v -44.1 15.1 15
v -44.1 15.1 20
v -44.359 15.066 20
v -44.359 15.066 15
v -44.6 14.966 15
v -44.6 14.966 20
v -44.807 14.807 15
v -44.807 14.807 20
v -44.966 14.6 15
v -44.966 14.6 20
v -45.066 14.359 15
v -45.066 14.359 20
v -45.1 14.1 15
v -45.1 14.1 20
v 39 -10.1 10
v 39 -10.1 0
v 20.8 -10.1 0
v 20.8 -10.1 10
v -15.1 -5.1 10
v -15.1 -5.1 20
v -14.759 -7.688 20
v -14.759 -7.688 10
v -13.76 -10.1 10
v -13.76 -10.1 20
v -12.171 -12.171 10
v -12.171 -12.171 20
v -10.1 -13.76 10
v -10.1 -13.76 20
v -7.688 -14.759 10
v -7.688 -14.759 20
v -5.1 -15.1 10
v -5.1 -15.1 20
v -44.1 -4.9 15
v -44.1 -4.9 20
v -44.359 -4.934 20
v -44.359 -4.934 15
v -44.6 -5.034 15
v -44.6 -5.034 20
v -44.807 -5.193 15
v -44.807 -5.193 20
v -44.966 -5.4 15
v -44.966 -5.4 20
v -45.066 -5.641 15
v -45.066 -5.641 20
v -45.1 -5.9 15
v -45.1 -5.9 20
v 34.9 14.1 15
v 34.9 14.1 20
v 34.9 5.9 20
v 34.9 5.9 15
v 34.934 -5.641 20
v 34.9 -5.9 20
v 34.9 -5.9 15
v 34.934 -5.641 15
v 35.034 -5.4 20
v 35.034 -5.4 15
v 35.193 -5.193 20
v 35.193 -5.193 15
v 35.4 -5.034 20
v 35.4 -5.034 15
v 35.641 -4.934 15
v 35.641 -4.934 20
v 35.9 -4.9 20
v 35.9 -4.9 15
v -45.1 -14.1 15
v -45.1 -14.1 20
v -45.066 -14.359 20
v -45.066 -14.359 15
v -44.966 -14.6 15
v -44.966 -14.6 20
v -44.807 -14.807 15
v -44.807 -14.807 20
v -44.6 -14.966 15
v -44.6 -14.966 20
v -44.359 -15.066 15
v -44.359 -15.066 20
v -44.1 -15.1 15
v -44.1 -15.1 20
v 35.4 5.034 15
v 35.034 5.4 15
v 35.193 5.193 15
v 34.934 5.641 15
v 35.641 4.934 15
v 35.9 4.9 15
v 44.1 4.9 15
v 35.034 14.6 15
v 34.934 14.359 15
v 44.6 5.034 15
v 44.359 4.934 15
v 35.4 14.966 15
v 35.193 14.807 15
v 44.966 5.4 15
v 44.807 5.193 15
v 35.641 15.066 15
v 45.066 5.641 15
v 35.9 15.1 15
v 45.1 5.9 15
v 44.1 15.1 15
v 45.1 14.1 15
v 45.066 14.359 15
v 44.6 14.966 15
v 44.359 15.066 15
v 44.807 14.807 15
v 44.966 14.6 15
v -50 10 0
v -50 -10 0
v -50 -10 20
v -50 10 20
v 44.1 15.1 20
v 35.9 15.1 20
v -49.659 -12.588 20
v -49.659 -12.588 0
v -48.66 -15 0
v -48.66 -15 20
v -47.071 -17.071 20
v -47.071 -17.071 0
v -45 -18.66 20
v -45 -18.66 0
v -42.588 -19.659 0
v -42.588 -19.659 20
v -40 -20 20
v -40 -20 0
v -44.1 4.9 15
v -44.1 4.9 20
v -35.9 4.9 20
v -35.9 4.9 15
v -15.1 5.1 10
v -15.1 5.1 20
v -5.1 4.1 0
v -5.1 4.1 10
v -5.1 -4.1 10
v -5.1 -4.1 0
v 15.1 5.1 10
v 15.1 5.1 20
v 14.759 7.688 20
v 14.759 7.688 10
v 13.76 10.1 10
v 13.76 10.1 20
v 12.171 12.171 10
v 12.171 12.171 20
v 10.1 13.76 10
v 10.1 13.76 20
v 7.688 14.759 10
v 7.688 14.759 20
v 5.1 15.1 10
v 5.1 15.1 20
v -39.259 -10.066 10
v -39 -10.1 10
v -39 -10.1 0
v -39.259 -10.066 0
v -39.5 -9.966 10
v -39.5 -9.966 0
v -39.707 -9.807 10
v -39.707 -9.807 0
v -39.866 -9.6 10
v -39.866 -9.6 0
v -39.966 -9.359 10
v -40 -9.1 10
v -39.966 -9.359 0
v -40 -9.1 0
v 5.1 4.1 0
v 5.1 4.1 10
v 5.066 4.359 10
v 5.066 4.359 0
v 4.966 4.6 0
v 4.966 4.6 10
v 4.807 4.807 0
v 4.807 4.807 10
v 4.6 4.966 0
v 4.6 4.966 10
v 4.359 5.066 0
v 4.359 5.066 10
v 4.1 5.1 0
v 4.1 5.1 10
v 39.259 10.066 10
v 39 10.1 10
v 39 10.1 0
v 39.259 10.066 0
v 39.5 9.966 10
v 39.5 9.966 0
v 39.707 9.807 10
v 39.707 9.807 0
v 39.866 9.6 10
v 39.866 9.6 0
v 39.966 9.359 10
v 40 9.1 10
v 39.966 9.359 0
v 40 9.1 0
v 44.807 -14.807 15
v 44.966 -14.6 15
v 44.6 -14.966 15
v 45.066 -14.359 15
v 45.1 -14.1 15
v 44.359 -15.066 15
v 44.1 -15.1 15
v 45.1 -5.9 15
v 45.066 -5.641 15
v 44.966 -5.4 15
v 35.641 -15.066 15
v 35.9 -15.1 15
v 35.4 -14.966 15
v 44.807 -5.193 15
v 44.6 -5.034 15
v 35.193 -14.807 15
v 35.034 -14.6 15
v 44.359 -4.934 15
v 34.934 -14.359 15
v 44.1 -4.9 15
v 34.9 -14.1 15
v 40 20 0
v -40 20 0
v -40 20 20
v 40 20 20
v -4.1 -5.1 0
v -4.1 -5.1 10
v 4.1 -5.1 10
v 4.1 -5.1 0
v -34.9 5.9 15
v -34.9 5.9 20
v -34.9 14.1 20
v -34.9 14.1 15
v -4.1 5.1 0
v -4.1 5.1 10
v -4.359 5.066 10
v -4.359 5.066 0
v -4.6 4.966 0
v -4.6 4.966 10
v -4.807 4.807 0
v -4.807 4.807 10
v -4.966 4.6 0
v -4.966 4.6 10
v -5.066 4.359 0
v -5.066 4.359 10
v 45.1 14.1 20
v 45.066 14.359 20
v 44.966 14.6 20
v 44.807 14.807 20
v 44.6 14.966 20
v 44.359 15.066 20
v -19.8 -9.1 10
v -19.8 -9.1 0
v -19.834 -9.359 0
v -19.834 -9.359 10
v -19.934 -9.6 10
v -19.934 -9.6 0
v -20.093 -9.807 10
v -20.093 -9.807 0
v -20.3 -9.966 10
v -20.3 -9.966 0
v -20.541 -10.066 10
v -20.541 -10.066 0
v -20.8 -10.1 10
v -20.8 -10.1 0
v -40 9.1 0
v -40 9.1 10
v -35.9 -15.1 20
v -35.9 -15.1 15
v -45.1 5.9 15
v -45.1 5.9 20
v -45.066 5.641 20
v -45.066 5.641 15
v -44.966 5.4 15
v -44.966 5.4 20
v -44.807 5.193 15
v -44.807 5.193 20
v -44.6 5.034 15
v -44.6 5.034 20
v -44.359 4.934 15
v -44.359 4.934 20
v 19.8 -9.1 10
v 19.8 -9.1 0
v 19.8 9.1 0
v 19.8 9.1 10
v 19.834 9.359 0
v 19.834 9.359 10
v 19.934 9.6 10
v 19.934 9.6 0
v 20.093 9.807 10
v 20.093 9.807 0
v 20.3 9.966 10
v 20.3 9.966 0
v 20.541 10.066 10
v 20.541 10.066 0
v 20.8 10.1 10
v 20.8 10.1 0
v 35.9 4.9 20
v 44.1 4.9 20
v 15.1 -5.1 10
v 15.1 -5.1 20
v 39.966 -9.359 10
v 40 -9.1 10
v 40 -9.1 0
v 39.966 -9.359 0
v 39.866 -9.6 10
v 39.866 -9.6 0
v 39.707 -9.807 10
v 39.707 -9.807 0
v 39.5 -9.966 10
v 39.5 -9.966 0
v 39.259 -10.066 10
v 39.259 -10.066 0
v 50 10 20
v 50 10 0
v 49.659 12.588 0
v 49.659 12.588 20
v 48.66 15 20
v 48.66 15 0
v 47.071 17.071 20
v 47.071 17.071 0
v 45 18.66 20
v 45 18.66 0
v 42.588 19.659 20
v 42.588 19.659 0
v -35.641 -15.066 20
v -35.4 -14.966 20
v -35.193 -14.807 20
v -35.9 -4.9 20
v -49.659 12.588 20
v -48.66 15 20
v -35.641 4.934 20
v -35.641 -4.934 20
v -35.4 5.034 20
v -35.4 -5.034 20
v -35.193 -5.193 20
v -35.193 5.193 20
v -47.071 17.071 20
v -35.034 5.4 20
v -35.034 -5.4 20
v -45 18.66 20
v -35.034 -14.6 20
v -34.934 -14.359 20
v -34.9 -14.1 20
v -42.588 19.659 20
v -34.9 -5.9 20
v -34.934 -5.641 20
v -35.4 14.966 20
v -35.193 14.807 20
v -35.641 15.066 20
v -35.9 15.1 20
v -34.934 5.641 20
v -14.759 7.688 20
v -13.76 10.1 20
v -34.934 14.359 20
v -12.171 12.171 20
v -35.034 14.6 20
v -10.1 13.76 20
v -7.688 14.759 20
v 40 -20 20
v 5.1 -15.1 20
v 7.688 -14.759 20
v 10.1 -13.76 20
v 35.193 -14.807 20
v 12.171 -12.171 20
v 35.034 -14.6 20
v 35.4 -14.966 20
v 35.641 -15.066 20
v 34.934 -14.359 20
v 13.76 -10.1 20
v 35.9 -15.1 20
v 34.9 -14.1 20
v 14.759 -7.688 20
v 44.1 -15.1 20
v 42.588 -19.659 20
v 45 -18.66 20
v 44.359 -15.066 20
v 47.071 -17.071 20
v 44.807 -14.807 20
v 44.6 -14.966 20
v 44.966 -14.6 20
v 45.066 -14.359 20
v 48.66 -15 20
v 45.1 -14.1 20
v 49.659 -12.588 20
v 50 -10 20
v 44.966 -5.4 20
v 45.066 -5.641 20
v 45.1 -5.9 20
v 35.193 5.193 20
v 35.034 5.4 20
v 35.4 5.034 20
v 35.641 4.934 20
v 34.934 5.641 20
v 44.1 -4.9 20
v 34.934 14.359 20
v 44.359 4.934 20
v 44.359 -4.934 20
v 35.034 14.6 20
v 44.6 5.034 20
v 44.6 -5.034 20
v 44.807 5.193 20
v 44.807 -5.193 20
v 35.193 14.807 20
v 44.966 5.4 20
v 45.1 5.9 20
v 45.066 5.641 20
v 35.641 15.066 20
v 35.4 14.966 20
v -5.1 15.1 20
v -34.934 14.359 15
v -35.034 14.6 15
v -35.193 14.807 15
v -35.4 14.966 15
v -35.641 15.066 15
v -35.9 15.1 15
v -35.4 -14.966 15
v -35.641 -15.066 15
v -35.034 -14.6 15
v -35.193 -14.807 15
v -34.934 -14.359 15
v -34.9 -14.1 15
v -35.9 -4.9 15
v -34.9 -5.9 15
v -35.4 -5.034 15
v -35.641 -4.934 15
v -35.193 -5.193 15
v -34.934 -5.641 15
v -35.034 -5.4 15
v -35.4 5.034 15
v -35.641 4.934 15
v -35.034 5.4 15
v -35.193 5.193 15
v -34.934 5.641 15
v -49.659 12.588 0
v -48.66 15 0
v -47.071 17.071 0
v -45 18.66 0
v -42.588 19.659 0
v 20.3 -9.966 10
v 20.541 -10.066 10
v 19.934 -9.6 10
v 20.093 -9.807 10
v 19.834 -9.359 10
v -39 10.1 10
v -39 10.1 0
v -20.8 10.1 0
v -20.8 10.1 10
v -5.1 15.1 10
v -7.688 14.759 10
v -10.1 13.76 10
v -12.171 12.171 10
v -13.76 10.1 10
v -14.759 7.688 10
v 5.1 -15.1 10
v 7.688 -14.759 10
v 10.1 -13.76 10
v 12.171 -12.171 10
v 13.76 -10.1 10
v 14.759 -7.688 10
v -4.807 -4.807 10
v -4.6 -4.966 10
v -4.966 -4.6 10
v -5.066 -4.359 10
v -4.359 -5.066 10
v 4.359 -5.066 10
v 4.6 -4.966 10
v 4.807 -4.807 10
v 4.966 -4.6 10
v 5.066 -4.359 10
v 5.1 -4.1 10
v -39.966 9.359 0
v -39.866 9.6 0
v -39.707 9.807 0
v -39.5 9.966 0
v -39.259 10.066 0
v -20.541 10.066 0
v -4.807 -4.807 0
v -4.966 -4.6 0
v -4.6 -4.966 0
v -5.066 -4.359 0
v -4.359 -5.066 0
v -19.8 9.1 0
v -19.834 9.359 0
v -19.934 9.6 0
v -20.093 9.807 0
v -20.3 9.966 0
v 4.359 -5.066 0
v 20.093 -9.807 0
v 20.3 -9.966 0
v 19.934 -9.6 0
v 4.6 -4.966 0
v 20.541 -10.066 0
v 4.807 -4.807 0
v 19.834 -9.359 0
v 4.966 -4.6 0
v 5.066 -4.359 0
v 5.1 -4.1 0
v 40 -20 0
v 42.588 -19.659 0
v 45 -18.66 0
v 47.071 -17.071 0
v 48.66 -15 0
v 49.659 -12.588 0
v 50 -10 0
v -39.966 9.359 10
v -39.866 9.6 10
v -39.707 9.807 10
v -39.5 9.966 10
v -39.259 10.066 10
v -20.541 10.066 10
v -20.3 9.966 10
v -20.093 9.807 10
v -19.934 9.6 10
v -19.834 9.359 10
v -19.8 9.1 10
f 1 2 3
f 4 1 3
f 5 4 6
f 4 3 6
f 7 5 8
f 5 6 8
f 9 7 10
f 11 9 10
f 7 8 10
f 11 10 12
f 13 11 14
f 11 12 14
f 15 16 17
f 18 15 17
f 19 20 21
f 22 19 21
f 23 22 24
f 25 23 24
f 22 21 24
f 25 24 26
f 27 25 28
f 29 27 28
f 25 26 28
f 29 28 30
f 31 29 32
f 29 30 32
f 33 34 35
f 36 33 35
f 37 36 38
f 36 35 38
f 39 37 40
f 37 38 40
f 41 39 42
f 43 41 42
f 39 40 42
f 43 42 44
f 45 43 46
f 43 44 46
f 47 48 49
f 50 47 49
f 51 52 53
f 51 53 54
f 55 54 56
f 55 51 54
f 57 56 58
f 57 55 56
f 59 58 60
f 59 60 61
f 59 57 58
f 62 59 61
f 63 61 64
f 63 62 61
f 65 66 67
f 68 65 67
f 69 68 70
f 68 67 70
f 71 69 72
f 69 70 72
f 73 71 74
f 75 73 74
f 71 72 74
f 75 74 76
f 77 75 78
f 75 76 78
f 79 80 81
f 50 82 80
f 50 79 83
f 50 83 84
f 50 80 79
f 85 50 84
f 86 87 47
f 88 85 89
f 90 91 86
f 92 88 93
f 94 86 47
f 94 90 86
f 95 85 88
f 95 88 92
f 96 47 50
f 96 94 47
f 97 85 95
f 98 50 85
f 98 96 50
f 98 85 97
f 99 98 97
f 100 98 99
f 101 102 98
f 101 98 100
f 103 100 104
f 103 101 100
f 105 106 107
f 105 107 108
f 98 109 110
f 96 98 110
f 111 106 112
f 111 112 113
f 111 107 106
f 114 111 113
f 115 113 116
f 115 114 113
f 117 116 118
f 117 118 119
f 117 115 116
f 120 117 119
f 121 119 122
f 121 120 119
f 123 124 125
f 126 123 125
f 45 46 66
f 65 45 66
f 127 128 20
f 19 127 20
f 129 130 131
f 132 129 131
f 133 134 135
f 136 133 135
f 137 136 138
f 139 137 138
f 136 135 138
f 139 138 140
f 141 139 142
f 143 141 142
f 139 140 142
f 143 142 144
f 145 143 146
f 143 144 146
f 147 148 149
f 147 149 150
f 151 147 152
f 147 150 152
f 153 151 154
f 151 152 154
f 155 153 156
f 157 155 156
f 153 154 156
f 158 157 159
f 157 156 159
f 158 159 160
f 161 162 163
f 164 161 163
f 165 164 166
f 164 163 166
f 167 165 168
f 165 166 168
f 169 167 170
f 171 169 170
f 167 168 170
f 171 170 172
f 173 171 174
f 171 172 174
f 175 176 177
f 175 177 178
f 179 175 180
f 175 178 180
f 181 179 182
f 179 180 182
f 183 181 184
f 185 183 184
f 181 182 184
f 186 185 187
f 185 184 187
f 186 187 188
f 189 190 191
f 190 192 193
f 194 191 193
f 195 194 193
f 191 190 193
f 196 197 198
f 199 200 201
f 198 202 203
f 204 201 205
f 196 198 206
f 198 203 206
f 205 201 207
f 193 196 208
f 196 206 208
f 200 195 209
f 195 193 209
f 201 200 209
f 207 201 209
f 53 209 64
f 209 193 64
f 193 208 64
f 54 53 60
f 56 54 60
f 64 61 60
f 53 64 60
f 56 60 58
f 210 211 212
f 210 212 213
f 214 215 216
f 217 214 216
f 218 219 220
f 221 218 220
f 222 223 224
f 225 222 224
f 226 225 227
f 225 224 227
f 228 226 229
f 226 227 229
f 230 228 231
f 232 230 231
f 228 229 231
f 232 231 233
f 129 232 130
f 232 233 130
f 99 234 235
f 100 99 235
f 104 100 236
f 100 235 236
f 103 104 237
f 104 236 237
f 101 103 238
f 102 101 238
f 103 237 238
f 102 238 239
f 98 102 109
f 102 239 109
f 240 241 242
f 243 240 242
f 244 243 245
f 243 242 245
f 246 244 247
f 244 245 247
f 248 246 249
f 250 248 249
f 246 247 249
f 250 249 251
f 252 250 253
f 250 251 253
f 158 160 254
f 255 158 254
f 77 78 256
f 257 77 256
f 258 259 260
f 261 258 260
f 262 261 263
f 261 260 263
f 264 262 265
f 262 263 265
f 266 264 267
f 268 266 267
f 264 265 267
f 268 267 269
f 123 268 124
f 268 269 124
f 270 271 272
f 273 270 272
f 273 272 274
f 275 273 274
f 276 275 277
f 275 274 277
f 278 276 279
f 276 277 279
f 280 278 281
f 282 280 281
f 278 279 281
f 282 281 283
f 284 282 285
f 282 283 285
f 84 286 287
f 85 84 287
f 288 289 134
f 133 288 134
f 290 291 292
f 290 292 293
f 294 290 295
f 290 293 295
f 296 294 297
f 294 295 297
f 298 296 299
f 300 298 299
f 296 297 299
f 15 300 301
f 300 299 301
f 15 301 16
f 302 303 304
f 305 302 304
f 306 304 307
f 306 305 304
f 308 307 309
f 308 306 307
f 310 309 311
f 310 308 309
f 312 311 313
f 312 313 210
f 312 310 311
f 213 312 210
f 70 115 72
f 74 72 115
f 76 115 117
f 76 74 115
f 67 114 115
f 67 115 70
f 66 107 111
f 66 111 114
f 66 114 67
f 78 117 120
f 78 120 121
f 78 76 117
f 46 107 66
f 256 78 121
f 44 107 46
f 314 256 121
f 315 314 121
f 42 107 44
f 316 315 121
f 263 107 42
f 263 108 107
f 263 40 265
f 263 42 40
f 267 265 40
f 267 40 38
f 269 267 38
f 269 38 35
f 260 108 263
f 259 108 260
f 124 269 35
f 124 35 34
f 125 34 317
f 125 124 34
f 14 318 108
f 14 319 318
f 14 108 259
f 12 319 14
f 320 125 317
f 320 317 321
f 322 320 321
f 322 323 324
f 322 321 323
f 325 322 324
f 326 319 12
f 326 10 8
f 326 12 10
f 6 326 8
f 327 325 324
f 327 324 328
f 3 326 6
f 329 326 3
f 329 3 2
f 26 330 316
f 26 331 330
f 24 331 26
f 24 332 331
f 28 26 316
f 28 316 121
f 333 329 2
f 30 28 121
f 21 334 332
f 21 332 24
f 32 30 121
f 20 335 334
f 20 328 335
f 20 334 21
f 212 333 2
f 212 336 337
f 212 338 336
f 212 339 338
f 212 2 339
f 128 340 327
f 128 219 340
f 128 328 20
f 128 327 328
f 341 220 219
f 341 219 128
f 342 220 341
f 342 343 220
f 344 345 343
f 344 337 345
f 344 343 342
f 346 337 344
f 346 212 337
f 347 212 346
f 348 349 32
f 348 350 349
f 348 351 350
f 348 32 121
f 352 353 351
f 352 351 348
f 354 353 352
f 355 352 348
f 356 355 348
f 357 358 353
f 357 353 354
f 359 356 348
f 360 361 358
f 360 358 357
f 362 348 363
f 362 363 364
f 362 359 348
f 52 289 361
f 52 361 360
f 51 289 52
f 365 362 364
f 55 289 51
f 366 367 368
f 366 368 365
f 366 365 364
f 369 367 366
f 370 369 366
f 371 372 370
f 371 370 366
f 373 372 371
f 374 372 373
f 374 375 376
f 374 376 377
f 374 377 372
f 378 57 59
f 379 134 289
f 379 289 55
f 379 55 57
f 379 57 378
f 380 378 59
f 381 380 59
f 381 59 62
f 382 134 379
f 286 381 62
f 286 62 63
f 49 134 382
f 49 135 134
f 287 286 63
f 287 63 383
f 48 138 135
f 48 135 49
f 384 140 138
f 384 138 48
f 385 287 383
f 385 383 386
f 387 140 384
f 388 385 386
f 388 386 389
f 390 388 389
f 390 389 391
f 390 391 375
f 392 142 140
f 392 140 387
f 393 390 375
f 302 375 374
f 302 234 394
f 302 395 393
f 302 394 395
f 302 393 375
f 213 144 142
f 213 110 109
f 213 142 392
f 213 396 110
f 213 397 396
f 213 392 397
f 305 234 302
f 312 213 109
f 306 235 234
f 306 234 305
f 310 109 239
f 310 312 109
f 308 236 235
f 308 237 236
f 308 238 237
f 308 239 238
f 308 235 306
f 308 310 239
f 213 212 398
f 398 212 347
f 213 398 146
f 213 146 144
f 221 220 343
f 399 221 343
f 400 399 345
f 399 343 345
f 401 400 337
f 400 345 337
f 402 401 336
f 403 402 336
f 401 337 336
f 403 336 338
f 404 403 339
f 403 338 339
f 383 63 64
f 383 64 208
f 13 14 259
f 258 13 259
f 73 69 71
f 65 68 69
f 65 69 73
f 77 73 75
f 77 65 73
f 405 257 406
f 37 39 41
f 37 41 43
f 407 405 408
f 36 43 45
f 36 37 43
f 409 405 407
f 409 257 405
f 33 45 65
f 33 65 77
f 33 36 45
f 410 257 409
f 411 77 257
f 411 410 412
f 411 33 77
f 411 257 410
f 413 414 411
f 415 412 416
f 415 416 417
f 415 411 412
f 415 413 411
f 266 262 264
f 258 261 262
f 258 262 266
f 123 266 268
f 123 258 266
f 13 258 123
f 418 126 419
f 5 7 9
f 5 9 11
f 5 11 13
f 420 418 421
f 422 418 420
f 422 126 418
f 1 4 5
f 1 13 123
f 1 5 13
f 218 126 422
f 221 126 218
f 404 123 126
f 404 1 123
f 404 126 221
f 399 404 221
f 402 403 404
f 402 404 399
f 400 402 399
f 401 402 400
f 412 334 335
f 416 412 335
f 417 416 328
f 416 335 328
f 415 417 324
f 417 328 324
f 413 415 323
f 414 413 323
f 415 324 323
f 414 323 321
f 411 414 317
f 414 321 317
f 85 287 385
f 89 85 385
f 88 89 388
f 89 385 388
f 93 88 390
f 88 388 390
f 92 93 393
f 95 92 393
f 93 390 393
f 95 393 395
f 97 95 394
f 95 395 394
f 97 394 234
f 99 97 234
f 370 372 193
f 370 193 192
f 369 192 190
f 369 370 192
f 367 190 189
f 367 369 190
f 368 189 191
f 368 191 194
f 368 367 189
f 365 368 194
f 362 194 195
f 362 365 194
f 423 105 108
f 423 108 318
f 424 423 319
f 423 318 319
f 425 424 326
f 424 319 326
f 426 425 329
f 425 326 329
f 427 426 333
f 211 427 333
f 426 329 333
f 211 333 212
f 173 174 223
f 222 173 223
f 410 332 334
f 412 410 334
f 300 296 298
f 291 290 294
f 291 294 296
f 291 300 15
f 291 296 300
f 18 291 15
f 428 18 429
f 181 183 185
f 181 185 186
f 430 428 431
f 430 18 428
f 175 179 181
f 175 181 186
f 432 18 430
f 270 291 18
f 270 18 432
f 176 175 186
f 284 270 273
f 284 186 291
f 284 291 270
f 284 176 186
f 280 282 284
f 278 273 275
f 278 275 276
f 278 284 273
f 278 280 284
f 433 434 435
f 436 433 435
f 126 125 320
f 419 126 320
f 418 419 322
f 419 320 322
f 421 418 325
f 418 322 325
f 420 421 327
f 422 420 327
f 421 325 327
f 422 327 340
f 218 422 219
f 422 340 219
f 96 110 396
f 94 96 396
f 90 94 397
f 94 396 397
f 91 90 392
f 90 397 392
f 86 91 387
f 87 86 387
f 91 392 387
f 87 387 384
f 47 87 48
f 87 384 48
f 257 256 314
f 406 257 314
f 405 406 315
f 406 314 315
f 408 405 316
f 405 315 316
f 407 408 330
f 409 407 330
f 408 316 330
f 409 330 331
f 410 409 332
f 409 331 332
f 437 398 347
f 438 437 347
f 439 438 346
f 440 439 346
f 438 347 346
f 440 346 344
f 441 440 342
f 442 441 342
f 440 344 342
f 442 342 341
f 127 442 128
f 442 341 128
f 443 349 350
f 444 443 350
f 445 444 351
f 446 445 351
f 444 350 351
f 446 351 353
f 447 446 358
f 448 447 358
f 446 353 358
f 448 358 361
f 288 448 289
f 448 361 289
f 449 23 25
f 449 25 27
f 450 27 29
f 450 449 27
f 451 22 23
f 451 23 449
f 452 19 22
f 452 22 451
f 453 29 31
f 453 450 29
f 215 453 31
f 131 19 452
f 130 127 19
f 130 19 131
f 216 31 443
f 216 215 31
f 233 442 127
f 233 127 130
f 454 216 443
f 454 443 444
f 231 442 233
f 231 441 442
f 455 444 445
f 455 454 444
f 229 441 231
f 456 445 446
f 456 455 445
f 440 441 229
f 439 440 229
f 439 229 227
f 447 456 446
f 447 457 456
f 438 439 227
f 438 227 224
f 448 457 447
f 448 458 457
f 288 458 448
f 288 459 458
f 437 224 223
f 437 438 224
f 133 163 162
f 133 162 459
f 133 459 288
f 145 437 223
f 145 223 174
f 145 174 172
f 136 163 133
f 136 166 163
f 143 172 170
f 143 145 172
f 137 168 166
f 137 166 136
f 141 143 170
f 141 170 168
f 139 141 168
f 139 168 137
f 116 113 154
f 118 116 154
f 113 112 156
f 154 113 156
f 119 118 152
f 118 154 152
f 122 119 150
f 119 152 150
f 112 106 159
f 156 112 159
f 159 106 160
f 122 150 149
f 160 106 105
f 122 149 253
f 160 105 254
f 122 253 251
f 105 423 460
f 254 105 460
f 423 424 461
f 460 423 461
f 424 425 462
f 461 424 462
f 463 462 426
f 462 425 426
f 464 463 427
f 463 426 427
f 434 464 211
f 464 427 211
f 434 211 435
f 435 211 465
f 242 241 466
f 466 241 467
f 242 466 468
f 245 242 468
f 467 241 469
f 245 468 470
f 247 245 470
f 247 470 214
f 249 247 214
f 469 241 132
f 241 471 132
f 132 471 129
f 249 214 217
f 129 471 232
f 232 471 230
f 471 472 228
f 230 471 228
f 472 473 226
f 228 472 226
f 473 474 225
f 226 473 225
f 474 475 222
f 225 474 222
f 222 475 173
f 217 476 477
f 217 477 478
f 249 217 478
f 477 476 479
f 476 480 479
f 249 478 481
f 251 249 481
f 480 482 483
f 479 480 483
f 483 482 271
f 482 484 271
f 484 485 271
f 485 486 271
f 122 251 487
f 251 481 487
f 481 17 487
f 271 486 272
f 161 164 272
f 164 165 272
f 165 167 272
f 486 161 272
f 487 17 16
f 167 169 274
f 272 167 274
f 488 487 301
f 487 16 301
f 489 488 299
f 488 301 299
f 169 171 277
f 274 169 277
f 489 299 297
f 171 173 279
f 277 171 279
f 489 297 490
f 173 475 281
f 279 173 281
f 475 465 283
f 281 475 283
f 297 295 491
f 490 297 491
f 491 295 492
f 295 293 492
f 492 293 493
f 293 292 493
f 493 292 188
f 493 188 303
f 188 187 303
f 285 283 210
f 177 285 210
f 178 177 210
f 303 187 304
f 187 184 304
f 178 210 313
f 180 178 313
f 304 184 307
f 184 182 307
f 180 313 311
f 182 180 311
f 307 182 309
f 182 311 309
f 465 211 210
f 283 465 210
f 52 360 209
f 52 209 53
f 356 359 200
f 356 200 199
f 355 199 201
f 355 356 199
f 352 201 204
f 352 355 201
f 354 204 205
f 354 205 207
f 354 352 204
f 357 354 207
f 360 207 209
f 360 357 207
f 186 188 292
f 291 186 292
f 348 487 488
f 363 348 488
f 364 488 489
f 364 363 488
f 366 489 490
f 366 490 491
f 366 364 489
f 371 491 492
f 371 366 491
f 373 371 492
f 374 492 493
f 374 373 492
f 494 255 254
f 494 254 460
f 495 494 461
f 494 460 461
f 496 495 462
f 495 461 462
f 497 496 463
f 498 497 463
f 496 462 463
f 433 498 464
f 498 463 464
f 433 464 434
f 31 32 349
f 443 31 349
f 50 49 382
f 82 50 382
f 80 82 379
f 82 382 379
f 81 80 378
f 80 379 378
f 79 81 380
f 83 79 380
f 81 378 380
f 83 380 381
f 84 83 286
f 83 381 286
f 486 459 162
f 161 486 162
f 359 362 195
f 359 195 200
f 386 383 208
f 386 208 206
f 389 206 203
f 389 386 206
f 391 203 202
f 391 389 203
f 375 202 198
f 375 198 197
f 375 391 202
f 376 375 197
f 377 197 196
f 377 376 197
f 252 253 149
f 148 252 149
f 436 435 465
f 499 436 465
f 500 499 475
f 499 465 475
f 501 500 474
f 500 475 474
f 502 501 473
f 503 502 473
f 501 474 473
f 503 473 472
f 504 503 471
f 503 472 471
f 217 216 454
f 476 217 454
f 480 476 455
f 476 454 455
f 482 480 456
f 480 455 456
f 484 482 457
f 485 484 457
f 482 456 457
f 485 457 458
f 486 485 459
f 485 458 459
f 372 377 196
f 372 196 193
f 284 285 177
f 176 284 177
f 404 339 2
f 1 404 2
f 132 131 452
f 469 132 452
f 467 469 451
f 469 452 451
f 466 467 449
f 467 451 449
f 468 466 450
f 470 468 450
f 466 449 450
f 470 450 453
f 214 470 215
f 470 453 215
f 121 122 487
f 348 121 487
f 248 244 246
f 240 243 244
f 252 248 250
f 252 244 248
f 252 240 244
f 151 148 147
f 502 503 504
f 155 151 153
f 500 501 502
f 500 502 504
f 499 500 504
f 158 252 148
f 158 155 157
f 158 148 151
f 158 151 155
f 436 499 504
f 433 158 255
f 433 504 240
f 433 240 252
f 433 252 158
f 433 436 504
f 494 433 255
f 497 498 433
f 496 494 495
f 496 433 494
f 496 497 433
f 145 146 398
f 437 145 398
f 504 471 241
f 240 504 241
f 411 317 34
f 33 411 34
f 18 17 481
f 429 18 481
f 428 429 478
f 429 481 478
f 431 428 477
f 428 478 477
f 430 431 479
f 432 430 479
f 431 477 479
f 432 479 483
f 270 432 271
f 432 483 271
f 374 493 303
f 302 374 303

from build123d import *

# Parameters (mm, degrees)
SKETCH_1_W          = 100
SKETCH_1_H          = 40
EXTRUDE_1_DEPTH     = 20
FILLET_2_R          = 10
CUT_EXTRUDE_1_DEPTH = 10
CUT_EXTRUDE_2_DEPTH = 55.772255751
CUT_EXTRUDE_3_DEPTH = 5
CUT_EXTRUDE_4_DEPTH = 10


with BuildPart() as part:
    # ｽｹｯﾁ1 → ﾎﾞｽ - 押し出し1 (new body)
    with BuildSketch(Plane.XY):
        Rectangle(SKETCH_1_W, SKETCH_1_H)
    extrude(amount=EXTRUDE_1_DEPTH)

    # ﾌｨﾚｯﾄ2
    fillet_2_edges = [part.edges().sort_by_distance(p)[0] for p in [
        (50, -20, 10),
        (-50, -20, 10),
        (-50, 20, 10),
        (50, 20, 10),
    ]]
    fillet(fillet_2_edges, radius=FILLET_2_R)

    # ｽｹｯﾁ2 → ｶｯﾄ - 押し出し1 (cut)
    with BuildSketch(Plane.XY.offset(20)):
        with BuildLine():
            Line((-5.1, -15.1), (5.1, -15.1))
            ThreePointArc((5.1, -15.1), (12.171067812, -12.171067812), (15.1, -5.1))
            Line((15.1, -5.1), (15.1, 5.1))
            ThreePointArc((15.1, 5.1), (12.171067812, 12.171067812), (5.1, 15.1))
            Line((5.1, 15.1), (-5.1, 15.1))
            ThreePointArc((-5.1, 15.1), (-12.171067812, 12.171067812), (-15.1, 5.1))
            Line((-15.1, 5.1), (-15.1, -5.1))
            ThreePointArc((-15.1, -5.1), (-12.171067812, -12.171067812), (-5.1, -15.1))
        make_face()
    extrude(amount=-CUT_EXTRUDE_1_DEPTH, mode=Mode.SUBTRACT)

    # ｽｹｯﾁ3 → ｶｯﾄ - 押し出し2 (cut, through all)
    with BuildSketch(Plane.XY.offset(10)):
        with BuildLine():
            Line((-4.1, -5.1), (4.1, -5.1))
            ThreePointArc((4.1, -5.1), (4.807106781, -4.807106781), (5.1, -4.1))
            Line((5.1, -4.1), (5.1, 4.1))
            ThreePointArc((5.1, 4.1), (4.807106781, 4.807106781), (4.1, 5.1))
            Line((4.1, 5.1), (-4.1, 5.1))
            ThreePointArc((-4.1, 5.1), (-4.807106781, 4.807106781), (-5.1, 4.1))
            Line((-5.1, 4.1), (-5.1, -4.1))
            ThreePointArc((-5.1, -4.1), (-4.807106781, -4.807106781), (-4.1, -5.1))
        make_face()
    extrude(amount=-CUT_EXTRUDE_2_DEPTH, mode=Mode.SUBTRACT)

    # ｽｹｯﾁ4 → ｶｯﾄ - 押し出し3 (cut)
    with BuildSketch(Plane.XY.offset(20)):
        with BuildLine():
            Line((44.1, 15.1), (35.9, 15.1))
            ThreePointArc((35.9, 15.1), (35.192893219, 14.807106781), (34.9, 14.1))
            Line((34.9, 14.1), (34.9, 5.9))
            ThreePointArc((34.9, 5.9), (35.192893219, 5.192893219), (35.9, 4.9))
            Line((35.9, 4.9), (44.1, 4.9))
            ThreePointArc((44.1, 4.9), (44.807106781, 5.192893219), (45.1, 5.9))
            Line((45.1, 5.9), (45.1, 14.1))
            ThreePointArc((45.1, 14.1), (44.807106781, 14.807106781), (44.1, 15.1))
        make_face()
        with BuildLine():
            Line((-44.1, 4.9), (-35.9, 4.9))
            ThreePointArc((-35.9, 4.9), (-35.192893219, 5.192893219), (-34.9, 5.9))
            Line((-34.9, 5.9), (-34.9, 14.1))
            ThreePointArc((-34.9, 14.1), (-35.192893219, 14.807106781), (-35.9, 15.1))
            Line((-35.9, 15.1), (-44.1, 15.1))
            ThreePointArc((-44.1, 15.1), (-44.807106781, 14.807106781), (-45.1, 14.1))
            Line((-45.1, 14.1), (-45.1, 5.9))
            ThreePointArc((-45.1, 5.9), (-44.807106781, 5.192893219), (-44.1, 4.9))
        make_face()
        with BuildLine():
            Line((45.1, -5.9), (45.1, -14.1))
            ThreePointArc((45.1, -14.1), (44.807106781, -14.807106781), (44.1, -15.1))
            Line((44.1, -15.1), (35.9, -15.1))
            ThreePointArc((35.9, -15.1), (35.192893219, -14.807106781), (34.9, -14.1))
            Line((34.9, -14.1), (34.9, -5.9))
            ThreePointArc((34.9, -5.9), (35.192893219, -5.192893219), (35.9, -4.9))
            Line((35.9, -4.9), (44.1, -4.9))
            ThreePointArc((44.1, -4.9), (44.807106781, -5.192893219), (45.1, -5.9))
        make_face()
        with BuildLine():
            Line((-44.1, -15.1), (-35.9, -15.1))
            ThreePointArc((-35.9, -15.1), (-35.192893219, -14.807106781), (-34.9, -14.1))
            Line((-34.9, -14.1), (-34.9, -5.9))
            ThreePointArc((-34.9, -5.9), (-35.192893219, -5.192893219), (-35.9, -4.9))
            Line((-35.9, -4.9), (-44.1, -4.9))
            ThreePointArc((-44.1, -4.9), (-44.807106781, -5.192893219), (-45.1, -5.9))
            Line((-45.1, -5.9), (-45.1, -14.1))
            ThreePointArc((-45.1, -14.1), (-44.807106781, -14.807106781), (-44.1, -15.1))
        make_face()
    extrude(amount=-CUT_EXTRUDE_3_DEPTH, mode=Mode.SUBTRACT)

    # ｽｹｯﾁ5 → ｶｯﾄ - 押し出し4 (cut)
    with BuildSketch(Plane(origin=(0, 0, 0), x_dir=(-1, 0, 0), z_dir=(0, 0, -1))):
        with BuildLine():
            Line((-39, -10.1), (-20.8, -10.1))
            ThreePointArc((-20.8, -10.1), (-20.092893219, -9.807106781), (-19.8, -9.1))
            Line((-19.8, -9.1), (-19.8, 9.1))
            ThreePointArc((-19.8, 9.1), (-20.092893219, 9.807106781), (-20.8, 10.1))
            Line((-20.8, 10.1), (-39, 10.1))
            ThreePointArc((-39, 10.1), (-39.707106781, 9.807106781), (-40, 9.1))
            Line((-40, 9.1), (-40, -9.1))
            ThreePointArc((-40, -9.1), (-39.707106781, -9.807106781), (-39, -10.1))
        make_face()
        with BuildLine():
            Line((20.8, -10.1), (39, -10.1))
            ThreePointArc((39, -10.1), (39.707106781, -9.807106781), (40, -9.1))
            Line((40, -9.1), (40, 9.1))
            ThreePointArc((40, 9.1), (39.707106781, 9.807106781), (39, 10.1))
            Line((39, 10.1), (20.8, 10.1))
            ThreePointArc((20.8, 10.1), (20.092893219, 9.807106781), (19.8, 9.1))
            Line((19.8, 9.1), (19.8, -9.1))
            ThreePointArc((19.8, -9.1), (20.092893219, -9.807106781), (20.8, -10.1))
        make_face()
    extrude(amount=-CUT_EXTRUDE_4_DEPTH, mode=Mode.SUBTRACT)


solid = part.part
